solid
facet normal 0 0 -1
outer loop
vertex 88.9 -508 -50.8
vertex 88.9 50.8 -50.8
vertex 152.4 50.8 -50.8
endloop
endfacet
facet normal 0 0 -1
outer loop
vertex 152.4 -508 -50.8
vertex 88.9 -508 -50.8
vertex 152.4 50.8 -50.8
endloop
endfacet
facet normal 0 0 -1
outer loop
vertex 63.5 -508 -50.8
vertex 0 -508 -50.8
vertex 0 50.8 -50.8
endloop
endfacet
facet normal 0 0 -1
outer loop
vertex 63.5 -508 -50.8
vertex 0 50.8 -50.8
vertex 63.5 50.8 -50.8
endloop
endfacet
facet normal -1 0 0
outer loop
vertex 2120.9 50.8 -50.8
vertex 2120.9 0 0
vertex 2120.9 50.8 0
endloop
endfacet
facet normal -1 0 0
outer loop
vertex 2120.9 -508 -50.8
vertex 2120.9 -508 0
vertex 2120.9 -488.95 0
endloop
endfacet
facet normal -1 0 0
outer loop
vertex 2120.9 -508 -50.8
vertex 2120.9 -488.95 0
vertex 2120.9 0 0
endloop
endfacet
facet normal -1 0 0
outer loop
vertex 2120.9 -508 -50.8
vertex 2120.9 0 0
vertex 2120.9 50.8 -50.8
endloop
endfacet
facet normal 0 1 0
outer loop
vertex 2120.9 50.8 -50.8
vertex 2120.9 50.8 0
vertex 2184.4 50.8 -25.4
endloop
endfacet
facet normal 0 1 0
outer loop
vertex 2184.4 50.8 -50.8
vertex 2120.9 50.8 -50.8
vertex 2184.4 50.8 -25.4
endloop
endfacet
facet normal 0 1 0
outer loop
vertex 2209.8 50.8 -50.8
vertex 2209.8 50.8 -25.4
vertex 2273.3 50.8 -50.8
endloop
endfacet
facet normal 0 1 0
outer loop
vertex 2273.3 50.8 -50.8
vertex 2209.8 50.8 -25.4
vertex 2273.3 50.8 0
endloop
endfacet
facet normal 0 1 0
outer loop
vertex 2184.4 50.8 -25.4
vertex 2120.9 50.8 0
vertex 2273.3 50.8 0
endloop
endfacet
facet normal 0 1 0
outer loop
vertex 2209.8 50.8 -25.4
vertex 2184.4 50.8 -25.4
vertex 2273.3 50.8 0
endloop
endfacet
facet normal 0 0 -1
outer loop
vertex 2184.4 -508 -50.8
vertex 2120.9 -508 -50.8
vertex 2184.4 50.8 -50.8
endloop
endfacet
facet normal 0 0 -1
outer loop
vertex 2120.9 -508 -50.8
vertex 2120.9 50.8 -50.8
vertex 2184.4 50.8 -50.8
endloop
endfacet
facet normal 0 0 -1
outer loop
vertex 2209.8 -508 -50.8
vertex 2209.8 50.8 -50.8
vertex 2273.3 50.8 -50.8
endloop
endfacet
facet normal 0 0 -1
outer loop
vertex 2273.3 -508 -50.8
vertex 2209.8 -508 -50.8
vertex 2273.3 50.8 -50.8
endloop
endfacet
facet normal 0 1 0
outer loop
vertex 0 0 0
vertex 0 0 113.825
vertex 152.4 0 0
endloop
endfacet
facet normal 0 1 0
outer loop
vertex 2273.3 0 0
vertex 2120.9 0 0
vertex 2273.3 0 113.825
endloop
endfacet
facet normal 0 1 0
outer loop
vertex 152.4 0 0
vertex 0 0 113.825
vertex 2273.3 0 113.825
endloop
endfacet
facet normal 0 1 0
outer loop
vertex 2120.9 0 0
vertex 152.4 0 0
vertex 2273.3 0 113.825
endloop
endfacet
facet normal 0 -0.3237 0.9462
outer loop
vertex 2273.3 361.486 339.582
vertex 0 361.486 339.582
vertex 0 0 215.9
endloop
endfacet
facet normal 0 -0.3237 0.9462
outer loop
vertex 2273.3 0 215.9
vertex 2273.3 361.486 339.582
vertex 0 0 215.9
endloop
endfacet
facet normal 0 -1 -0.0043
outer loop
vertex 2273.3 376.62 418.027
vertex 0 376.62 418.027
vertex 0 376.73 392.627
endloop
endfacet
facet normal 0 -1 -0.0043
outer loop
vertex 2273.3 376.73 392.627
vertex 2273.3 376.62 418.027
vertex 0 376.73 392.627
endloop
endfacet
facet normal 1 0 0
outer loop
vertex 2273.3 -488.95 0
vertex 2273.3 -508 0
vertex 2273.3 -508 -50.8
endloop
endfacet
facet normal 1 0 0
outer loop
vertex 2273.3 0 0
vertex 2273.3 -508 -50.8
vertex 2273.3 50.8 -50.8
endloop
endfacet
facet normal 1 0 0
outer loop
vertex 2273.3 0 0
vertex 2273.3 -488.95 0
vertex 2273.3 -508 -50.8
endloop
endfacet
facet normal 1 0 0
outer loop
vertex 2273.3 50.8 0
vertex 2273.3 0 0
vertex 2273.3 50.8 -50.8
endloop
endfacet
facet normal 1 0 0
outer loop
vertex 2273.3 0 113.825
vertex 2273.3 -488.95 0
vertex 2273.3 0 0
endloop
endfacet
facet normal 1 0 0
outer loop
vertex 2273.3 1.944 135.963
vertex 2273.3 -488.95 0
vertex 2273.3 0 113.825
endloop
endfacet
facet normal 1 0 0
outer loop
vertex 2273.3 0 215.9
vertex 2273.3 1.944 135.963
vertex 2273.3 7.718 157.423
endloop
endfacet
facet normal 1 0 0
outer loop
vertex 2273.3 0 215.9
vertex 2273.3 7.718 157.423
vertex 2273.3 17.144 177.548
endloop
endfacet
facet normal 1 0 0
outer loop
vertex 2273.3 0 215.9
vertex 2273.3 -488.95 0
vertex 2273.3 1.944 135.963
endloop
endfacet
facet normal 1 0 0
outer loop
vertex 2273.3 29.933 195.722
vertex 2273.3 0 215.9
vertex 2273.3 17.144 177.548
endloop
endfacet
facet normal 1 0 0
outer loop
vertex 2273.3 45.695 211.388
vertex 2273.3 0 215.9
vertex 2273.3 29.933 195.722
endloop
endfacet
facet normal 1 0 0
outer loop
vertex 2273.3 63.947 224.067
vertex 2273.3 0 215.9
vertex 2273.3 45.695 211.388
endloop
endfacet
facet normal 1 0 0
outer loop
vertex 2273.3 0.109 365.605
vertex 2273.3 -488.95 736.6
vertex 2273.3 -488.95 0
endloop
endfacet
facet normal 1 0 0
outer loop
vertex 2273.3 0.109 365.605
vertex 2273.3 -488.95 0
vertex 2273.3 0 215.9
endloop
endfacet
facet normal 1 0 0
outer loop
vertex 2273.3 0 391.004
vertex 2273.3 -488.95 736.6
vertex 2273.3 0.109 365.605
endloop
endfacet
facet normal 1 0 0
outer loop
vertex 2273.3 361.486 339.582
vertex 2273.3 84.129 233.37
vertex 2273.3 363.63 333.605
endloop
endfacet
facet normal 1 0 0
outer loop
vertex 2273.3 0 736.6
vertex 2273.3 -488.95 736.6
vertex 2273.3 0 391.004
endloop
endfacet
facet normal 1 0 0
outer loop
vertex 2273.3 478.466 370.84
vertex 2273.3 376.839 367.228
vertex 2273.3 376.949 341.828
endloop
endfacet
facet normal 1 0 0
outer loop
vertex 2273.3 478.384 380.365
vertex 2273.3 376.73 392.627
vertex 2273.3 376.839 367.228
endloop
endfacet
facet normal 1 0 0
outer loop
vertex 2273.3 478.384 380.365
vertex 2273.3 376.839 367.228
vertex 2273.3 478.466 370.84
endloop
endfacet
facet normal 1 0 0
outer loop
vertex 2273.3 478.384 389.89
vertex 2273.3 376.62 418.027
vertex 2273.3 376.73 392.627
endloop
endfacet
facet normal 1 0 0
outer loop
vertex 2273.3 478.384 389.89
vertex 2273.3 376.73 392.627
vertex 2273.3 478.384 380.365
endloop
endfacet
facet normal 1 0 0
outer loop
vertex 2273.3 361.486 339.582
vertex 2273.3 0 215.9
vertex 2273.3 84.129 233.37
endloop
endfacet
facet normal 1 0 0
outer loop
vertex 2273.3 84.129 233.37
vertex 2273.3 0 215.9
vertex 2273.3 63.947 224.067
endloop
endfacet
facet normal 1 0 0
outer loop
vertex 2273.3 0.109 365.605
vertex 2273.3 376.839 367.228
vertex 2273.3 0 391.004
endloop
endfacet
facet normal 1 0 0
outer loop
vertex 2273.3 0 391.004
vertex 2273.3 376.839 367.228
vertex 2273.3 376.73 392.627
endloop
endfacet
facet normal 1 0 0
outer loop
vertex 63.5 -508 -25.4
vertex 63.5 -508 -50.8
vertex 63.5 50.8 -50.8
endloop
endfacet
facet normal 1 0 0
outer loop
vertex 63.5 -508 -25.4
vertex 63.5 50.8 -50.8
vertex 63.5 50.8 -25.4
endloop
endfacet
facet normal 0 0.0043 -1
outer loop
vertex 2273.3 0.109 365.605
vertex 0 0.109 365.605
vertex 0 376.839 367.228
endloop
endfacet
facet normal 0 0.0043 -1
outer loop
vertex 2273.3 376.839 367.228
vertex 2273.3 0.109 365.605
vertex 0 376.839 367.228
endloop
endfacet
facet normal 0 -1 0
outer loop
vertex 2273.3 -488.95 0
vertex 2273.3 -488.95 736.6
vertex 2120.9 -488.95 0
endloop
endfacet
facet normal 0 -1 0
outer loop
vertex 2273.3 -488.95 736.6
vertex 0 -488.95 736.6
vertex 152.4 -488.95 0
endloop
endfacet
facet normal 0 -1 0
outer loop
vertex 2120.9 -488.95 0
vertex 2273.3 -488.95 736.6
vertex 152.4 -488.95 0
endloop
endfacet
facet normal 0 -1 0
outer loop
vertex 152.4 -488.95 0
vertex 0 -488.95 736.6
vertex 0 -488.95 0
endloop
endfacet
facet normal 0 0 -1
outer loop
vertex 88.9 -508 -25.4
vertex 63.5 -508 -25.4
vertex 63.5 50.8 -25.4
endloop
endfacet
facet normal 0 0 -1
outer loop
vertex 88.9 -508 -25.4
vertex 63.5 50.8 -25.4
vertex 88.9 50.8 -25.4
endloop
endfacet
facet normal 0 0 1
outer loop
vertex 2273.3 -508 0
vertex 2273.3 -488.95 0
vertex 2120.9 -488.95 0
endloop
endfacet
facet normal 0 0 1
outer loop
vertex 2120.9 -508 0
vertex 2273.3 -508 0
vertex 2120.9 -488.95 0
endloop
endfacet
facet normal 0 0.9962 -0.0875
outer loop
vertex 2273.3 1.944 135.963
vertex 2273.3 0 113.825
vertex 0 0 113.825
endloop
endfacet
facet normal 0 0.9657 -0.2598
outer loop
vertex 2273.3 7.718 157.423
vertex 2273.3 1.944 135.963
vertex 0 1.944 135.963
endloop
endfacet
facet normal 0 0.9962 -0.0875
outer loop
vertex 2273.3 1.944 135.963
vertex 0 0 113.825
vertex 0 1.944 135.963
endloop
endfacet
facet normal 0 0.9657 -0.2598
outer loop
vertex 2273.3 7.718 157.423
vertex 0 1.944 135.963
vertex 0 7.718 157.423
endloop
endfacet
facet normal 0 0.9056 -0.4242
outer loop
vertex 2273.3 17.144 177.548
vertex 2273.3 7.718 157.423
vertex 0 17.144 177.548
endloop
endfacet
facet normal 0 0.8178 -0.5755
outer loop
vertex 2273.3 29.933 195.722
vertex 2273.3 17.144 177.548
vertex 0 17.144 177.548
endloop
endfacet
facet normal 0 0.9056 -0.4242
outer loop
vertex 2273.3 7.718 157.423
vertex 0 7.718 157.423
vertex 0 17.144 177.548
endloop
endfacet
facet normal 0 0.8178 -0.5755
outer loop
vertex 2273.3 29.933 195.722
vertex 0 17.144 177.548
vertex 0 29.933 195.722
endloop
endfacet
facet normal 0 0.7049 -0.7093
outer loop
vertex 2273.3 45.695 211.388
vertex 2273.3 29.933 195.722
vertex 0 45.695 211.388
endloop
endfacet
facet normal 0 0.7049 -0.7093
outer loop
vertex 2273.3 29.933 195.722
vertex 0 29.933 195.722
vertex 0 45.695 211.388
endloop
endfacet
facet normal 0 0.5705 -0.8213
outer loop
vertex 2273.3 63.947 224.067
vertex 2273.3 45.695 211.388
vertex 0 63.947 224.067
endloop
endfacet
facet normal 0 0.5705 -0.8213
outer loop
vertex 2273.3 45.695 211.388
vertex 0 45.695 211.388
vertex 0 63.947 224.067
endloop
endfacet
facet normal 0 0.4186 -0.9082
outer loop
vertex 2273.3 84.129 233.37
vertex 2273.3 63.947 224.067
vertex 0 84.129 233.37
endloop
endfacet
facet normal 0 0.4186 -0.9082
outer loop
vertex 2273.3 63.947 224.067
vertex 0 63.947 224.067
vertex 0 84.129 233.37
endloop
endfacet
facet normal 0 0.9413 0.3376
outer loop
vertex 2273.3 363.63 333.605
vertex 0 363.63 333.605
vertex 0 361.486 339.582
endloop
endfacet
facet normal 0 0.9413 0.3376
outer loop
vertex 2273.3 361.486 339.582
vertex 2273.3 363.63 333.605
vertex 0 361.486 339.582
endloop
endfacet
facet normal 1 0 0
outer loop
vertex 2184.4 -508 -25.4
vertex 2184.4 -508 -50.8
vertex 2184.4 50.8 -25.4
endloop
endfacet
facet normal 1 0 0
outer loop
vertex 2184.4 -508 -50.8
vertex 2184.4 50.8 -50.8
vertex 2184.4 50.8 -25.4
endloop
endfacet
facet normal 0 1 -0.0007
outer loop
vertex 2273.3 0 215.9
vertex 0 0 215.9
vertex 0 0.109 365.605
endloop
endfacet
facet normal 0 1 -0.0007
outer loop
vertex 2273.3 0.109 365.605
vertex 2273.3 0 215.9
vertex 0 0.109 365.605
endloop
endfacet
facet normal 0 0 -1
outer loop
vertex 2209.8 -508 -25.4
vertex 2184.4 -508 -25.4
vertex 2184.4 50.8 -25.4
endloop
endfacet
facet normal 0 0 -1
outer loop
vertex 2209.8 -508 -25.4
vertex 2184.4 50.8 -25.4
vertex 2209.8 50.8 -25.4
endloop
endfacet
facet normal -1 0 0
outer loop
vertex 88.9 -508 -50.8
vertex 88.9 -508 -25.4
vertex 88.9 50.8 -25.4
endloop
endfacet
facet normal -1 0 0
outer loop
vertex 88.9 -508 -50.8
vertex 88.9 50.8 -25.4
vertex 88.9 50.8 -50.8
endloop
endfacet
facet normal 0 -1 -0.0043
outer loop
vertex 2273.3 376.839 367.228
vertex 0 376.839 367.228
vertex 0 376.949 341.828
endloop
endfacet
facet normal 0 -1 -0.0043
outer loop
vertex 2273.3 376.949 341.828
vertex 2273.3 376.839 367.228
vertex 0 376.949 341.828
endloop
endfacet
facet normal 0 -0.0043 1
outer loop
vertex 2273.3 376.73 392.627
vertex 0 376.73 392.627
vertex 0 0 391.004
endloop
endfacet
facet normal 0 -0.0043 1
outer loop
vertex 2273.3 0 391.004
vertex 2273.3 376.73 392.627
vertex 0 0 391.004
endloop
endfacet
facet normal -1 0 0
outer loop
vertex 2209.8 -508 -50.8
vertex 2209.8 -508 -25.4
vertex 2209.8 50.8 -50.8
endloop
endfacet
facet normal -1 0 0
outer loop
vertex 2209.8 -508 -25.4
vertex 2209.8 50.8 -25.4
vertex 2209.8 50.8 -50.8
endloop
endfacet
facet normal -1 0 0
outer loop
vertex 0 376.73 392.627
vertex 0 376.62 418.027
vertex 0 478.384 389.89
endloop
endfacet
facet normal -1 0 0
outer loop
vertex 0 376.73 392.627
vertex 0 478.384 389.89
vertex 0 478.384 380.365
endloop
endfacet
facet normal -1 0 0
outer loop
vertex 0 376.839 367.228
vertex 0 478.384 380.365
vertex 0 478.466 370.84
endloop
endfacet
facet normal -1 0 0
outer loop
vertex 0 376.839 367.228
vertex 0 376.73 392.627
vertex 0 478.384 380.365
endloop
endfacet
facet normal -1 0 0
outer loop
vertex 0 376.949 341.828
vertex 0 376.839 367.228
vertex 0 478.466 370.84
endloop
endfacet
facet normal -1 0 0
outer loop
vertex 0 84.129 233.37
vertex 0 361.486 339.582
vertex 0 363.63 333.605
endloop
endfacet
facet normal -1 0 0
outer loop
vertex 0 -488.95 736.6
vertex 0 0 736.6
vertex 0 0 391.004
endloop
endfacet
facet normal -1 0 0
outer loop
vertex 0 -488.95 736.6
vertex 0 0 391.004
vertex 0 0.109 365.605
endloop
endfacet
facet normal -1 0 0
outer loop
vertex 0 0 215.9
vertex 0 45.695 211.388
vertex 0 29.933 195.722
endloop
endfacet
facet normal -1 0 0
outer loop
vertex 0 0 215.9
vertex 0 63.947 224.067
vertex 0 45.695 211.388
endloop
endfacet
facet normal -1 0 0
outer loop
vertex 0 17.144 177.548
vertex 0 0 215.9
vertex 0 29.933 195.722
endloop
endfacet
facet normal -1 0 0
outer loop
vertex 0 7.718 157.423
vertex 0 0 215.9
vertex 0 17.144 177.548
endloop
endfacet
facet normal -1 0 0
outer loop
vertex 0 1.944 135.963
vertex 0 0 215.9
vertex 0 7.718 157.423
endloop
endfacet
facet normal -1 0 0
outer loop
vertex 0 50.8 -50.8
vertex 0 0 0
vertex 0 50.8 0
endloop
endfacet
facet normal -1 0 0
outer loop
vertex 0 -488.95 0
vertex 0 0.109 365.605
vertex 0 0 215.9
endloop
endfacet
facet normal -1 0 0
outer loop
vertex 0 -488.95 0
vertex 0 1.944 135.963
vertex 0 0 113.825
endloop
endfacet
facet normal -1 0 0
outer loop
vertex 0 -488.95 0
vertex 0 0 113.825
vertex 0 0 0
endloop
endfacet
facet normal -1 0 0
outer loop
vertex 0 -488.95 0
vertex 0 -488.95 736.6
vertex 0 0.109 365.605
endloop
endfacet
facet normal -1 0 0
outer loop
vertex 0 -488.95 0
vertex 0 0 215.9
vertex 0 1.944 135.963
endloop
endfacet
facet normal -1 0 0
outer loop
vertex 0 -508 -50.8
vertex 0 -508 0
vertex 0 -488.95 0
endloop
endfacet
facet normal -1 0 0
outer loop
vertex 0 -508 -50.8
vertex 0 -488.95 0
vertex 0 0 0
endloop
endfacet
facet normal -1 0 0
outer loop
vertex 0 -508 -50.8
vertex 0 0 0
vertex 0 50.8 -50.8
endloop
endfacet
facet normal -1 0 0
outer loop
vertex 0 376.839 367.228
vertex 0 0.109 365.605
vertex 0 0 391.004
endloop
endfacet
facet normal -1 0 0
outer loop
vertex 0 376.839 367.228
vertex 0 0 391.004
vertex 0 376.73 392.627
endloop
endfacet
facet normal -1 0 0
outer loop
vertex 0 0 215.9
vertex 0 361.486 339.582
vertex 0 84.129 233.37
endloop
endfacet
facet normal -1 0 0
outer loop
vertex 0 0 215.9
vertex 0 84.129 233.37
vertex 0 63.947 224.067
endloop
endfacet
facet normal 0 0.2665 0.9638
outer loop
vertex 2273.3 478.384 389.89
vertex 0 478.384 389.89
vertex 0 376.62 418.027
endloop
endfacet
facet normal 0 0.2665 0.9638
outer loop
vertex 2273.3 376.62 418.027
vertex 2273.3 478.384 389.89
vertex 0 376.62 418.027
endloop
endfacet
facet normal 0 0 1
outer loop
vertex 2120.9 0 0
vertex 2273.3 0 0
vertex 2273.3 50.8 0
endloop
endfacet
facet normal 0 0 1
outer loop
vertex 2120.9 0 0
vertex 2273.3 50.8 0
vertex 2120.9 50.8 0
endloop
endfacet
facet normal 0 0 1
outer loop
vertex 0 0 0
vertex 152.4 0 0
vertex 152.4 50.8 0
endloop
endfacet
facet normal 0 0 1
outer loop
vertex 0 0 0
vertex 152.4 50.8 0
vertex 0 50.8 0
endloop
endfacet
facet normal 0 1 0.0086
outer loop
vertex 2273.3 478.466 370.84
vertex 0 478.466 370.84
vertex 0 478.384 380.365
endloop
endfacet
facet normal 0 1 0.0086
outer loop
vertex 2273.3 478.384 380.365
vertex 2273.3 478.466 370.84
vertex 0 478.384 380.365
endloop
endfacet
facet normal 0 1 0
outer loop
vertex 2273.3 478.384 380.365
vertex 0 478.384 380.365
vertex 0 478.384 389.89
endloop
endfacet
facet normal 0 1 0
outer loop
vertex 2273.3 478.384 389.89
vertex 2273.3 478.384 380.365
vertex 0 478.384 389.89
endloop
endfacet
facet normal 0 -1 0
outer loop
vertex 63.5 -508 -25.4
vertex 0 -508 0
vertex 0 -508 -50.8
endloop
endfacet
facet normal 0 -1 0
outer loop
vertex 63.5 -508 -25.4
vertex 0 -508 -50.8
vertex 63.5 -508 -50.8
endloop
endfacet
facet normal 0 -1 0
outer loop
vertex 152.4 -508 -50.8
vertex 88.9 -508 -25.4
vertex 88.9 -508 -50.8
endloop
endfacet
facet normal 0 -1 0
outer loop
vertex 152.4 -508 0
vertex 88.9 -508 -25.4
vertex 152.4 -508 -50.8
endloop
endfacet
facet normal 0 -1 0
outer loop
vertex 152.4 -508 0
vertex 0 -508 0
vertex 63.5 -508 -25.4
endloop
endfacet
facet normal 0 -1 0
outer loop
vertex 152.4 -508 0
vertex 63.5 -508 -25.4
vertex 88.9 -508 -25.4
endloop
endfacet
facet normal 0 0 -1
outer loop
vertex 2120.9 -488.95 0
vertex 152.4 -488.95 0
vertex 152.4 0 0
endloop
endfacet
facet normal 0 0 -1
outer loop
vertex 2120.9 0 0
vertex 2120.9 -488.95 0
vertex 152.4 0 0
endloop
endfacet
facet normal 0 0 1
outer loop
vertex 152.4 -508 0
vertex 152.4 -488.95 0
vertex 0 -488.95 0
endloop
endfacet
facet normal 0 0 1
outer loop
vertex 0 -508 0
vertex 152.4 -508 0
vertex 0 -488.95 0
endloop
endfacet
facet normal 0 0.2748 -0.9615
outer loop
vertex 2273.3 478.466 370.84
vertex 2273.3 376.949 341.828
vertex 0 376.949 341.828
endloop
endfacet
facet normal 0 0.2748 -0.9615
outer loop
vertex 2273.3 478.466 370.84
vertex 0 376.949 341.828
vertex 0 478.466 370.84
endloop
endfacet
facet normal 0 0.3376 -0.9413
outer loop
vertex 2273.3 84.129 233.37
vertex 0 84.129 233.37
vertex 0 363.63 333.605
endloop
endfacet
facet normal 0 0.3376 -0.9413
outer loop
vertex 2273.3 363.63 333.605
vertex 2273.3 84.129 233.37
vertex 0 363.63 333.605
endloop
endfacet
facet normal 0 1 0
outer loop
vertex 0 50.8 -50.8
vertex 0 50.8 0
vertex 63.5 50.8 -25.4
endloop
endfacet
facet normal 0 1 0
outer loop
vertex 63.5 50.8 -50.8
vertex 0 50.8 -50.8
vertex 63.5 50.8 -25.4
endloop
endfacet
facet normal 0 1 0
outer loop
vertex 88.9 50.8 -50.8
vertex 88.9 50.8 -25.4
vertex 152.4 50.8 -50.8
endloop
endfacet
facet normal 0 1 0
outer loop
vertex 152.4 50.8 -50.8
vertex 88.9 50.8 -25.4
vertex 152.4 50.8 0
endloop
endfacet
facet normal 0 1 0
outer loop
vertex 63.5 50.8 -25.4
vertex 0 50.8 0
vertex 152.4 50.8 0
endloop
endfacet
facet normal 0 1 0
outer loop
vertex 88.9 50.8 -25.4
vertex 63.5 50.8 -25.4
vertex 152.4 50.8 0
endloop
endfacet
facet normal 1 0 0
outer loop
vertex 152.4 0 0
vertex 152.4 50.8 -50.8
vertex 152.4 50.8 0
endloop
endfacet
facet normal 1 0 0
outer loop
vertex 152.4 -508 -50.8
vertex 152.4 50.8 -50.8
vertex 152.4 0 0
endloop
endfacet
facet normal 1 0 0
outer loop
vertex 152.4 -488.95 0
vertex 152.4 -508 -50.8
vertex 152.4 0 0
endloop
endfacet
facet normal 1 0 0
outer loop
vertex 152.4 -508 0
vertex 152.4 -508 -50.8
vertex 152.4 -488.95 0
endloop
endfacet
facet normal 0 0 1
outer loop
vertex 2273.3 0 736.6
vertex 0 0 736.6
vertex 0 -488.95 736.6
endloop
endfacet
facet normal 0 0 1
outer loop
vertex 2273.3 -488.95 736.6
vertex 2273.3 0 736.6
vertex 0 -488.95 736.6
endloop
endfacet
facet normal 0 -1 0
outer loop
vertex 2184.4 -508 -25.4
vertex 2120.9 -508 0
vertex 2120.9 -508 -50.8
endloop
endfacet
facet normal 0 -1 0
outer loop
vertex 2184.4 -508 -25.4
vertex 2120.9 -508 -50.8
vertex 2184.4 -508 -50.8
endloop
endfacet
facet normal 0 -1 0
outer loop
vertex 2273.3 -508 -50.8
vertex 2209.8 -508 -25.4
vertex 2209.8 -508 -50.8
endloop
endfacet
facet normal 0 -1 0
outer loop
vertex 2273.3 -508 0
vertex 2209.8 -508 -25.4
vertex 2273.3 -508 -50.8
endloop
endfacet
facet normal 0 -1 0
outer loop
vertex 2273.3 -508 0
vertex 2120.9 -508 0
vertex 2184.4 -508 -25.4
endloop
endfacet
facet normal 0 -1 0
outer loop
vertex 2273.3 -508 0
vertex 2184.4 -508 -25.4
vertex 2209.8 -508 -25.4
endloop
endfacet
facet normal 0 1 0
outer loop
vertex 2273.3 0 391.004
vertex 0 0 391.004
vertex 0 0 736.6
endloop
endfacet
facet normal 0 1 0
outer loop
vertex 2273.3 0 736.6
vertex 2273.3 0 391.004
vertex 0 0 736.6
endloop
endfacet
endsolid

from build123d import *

# Parameters (mm, degrees)
F1_DEPTH      = 2273.3
F3_DEPTH      = 508
F3_DEPTH_BACK = 50.8


with BuildPart() as f1:
    # F0 (on Right) → F1 (new body)
    with BuildSketch(Plane.YZ):
        with BuildLine():
            Line((-488.95, 736.6), (-488.95, 0))
            Line((-488.95, 0), (0, 0))
            Line((0, 0), (0, 113.825072))
            ThreePointArc((0, 113.825072), (23.140339, 186.915227), (84.128674, 233.370249))
            Line((84.128674, 233.370249), (363.629878, 333.605051))
            Line((363.629878, 333.605051), (361.486311, 339.58231))
            Line((361.486311, 339.58231), (0, 215.9))
            Line((0, 215.9), (0.10941, 365.604809))
            Line((0.10941, 365.604809), (0, 378.304337))
            Line((0, 378.304337), (0, 391.004337))
            Line((0, 391.004337), (0, 736.6))
            Line((0, 736.6), (-488.95, 736.6))
        make_face()
        Polygon((376.729838, 392.627121), (0, 391.004337), (0, 378.304337), (0.10941, 365.604809), (376.839247, 367.227592), (376.784543, 379.927357), align=None)
        Polygon((376.620426, 418.027003), (376.729838, 392.627121), (376.784543, 379.927357), (478.3836, 380.365), (478.3836, 389.89), align=None)
        Polygon((478.3836, 380.365), (376.784543, 379.927357), (376.839247, 367.227592), (376.948659, 341.82771), (478.465657, 370.840353), align=None)
    extrude(amount=F1_DEPTH)

    # F2 (on Front) → F3 (join, two sides)
    with BuildSketch(Plane.XZ) as f3_sk:
        Polygon((76.2, 0), (0, 0), (0, -50.8), (63.5, -50.8), (63.5, -25.4), (88.9, -25.4), (88.9, -50.8), (152.4, -50.8), (152.4, 0), align=None)
        Polygon((2273.3, -50.8), (2273.3, 0), (2197.1, 0), (2120.9, 0), (2120.9, -50.8), (2184.4, -50.8), (2184.4, -25.4), (2209.8, -25.4), (2209.8, -50.8), align=None)
    extrude(amount=F3_DEPTH)
    extrude(f3_sk.sketch, amount=-F3_DEPTH_BACK)


solid = f1.part
